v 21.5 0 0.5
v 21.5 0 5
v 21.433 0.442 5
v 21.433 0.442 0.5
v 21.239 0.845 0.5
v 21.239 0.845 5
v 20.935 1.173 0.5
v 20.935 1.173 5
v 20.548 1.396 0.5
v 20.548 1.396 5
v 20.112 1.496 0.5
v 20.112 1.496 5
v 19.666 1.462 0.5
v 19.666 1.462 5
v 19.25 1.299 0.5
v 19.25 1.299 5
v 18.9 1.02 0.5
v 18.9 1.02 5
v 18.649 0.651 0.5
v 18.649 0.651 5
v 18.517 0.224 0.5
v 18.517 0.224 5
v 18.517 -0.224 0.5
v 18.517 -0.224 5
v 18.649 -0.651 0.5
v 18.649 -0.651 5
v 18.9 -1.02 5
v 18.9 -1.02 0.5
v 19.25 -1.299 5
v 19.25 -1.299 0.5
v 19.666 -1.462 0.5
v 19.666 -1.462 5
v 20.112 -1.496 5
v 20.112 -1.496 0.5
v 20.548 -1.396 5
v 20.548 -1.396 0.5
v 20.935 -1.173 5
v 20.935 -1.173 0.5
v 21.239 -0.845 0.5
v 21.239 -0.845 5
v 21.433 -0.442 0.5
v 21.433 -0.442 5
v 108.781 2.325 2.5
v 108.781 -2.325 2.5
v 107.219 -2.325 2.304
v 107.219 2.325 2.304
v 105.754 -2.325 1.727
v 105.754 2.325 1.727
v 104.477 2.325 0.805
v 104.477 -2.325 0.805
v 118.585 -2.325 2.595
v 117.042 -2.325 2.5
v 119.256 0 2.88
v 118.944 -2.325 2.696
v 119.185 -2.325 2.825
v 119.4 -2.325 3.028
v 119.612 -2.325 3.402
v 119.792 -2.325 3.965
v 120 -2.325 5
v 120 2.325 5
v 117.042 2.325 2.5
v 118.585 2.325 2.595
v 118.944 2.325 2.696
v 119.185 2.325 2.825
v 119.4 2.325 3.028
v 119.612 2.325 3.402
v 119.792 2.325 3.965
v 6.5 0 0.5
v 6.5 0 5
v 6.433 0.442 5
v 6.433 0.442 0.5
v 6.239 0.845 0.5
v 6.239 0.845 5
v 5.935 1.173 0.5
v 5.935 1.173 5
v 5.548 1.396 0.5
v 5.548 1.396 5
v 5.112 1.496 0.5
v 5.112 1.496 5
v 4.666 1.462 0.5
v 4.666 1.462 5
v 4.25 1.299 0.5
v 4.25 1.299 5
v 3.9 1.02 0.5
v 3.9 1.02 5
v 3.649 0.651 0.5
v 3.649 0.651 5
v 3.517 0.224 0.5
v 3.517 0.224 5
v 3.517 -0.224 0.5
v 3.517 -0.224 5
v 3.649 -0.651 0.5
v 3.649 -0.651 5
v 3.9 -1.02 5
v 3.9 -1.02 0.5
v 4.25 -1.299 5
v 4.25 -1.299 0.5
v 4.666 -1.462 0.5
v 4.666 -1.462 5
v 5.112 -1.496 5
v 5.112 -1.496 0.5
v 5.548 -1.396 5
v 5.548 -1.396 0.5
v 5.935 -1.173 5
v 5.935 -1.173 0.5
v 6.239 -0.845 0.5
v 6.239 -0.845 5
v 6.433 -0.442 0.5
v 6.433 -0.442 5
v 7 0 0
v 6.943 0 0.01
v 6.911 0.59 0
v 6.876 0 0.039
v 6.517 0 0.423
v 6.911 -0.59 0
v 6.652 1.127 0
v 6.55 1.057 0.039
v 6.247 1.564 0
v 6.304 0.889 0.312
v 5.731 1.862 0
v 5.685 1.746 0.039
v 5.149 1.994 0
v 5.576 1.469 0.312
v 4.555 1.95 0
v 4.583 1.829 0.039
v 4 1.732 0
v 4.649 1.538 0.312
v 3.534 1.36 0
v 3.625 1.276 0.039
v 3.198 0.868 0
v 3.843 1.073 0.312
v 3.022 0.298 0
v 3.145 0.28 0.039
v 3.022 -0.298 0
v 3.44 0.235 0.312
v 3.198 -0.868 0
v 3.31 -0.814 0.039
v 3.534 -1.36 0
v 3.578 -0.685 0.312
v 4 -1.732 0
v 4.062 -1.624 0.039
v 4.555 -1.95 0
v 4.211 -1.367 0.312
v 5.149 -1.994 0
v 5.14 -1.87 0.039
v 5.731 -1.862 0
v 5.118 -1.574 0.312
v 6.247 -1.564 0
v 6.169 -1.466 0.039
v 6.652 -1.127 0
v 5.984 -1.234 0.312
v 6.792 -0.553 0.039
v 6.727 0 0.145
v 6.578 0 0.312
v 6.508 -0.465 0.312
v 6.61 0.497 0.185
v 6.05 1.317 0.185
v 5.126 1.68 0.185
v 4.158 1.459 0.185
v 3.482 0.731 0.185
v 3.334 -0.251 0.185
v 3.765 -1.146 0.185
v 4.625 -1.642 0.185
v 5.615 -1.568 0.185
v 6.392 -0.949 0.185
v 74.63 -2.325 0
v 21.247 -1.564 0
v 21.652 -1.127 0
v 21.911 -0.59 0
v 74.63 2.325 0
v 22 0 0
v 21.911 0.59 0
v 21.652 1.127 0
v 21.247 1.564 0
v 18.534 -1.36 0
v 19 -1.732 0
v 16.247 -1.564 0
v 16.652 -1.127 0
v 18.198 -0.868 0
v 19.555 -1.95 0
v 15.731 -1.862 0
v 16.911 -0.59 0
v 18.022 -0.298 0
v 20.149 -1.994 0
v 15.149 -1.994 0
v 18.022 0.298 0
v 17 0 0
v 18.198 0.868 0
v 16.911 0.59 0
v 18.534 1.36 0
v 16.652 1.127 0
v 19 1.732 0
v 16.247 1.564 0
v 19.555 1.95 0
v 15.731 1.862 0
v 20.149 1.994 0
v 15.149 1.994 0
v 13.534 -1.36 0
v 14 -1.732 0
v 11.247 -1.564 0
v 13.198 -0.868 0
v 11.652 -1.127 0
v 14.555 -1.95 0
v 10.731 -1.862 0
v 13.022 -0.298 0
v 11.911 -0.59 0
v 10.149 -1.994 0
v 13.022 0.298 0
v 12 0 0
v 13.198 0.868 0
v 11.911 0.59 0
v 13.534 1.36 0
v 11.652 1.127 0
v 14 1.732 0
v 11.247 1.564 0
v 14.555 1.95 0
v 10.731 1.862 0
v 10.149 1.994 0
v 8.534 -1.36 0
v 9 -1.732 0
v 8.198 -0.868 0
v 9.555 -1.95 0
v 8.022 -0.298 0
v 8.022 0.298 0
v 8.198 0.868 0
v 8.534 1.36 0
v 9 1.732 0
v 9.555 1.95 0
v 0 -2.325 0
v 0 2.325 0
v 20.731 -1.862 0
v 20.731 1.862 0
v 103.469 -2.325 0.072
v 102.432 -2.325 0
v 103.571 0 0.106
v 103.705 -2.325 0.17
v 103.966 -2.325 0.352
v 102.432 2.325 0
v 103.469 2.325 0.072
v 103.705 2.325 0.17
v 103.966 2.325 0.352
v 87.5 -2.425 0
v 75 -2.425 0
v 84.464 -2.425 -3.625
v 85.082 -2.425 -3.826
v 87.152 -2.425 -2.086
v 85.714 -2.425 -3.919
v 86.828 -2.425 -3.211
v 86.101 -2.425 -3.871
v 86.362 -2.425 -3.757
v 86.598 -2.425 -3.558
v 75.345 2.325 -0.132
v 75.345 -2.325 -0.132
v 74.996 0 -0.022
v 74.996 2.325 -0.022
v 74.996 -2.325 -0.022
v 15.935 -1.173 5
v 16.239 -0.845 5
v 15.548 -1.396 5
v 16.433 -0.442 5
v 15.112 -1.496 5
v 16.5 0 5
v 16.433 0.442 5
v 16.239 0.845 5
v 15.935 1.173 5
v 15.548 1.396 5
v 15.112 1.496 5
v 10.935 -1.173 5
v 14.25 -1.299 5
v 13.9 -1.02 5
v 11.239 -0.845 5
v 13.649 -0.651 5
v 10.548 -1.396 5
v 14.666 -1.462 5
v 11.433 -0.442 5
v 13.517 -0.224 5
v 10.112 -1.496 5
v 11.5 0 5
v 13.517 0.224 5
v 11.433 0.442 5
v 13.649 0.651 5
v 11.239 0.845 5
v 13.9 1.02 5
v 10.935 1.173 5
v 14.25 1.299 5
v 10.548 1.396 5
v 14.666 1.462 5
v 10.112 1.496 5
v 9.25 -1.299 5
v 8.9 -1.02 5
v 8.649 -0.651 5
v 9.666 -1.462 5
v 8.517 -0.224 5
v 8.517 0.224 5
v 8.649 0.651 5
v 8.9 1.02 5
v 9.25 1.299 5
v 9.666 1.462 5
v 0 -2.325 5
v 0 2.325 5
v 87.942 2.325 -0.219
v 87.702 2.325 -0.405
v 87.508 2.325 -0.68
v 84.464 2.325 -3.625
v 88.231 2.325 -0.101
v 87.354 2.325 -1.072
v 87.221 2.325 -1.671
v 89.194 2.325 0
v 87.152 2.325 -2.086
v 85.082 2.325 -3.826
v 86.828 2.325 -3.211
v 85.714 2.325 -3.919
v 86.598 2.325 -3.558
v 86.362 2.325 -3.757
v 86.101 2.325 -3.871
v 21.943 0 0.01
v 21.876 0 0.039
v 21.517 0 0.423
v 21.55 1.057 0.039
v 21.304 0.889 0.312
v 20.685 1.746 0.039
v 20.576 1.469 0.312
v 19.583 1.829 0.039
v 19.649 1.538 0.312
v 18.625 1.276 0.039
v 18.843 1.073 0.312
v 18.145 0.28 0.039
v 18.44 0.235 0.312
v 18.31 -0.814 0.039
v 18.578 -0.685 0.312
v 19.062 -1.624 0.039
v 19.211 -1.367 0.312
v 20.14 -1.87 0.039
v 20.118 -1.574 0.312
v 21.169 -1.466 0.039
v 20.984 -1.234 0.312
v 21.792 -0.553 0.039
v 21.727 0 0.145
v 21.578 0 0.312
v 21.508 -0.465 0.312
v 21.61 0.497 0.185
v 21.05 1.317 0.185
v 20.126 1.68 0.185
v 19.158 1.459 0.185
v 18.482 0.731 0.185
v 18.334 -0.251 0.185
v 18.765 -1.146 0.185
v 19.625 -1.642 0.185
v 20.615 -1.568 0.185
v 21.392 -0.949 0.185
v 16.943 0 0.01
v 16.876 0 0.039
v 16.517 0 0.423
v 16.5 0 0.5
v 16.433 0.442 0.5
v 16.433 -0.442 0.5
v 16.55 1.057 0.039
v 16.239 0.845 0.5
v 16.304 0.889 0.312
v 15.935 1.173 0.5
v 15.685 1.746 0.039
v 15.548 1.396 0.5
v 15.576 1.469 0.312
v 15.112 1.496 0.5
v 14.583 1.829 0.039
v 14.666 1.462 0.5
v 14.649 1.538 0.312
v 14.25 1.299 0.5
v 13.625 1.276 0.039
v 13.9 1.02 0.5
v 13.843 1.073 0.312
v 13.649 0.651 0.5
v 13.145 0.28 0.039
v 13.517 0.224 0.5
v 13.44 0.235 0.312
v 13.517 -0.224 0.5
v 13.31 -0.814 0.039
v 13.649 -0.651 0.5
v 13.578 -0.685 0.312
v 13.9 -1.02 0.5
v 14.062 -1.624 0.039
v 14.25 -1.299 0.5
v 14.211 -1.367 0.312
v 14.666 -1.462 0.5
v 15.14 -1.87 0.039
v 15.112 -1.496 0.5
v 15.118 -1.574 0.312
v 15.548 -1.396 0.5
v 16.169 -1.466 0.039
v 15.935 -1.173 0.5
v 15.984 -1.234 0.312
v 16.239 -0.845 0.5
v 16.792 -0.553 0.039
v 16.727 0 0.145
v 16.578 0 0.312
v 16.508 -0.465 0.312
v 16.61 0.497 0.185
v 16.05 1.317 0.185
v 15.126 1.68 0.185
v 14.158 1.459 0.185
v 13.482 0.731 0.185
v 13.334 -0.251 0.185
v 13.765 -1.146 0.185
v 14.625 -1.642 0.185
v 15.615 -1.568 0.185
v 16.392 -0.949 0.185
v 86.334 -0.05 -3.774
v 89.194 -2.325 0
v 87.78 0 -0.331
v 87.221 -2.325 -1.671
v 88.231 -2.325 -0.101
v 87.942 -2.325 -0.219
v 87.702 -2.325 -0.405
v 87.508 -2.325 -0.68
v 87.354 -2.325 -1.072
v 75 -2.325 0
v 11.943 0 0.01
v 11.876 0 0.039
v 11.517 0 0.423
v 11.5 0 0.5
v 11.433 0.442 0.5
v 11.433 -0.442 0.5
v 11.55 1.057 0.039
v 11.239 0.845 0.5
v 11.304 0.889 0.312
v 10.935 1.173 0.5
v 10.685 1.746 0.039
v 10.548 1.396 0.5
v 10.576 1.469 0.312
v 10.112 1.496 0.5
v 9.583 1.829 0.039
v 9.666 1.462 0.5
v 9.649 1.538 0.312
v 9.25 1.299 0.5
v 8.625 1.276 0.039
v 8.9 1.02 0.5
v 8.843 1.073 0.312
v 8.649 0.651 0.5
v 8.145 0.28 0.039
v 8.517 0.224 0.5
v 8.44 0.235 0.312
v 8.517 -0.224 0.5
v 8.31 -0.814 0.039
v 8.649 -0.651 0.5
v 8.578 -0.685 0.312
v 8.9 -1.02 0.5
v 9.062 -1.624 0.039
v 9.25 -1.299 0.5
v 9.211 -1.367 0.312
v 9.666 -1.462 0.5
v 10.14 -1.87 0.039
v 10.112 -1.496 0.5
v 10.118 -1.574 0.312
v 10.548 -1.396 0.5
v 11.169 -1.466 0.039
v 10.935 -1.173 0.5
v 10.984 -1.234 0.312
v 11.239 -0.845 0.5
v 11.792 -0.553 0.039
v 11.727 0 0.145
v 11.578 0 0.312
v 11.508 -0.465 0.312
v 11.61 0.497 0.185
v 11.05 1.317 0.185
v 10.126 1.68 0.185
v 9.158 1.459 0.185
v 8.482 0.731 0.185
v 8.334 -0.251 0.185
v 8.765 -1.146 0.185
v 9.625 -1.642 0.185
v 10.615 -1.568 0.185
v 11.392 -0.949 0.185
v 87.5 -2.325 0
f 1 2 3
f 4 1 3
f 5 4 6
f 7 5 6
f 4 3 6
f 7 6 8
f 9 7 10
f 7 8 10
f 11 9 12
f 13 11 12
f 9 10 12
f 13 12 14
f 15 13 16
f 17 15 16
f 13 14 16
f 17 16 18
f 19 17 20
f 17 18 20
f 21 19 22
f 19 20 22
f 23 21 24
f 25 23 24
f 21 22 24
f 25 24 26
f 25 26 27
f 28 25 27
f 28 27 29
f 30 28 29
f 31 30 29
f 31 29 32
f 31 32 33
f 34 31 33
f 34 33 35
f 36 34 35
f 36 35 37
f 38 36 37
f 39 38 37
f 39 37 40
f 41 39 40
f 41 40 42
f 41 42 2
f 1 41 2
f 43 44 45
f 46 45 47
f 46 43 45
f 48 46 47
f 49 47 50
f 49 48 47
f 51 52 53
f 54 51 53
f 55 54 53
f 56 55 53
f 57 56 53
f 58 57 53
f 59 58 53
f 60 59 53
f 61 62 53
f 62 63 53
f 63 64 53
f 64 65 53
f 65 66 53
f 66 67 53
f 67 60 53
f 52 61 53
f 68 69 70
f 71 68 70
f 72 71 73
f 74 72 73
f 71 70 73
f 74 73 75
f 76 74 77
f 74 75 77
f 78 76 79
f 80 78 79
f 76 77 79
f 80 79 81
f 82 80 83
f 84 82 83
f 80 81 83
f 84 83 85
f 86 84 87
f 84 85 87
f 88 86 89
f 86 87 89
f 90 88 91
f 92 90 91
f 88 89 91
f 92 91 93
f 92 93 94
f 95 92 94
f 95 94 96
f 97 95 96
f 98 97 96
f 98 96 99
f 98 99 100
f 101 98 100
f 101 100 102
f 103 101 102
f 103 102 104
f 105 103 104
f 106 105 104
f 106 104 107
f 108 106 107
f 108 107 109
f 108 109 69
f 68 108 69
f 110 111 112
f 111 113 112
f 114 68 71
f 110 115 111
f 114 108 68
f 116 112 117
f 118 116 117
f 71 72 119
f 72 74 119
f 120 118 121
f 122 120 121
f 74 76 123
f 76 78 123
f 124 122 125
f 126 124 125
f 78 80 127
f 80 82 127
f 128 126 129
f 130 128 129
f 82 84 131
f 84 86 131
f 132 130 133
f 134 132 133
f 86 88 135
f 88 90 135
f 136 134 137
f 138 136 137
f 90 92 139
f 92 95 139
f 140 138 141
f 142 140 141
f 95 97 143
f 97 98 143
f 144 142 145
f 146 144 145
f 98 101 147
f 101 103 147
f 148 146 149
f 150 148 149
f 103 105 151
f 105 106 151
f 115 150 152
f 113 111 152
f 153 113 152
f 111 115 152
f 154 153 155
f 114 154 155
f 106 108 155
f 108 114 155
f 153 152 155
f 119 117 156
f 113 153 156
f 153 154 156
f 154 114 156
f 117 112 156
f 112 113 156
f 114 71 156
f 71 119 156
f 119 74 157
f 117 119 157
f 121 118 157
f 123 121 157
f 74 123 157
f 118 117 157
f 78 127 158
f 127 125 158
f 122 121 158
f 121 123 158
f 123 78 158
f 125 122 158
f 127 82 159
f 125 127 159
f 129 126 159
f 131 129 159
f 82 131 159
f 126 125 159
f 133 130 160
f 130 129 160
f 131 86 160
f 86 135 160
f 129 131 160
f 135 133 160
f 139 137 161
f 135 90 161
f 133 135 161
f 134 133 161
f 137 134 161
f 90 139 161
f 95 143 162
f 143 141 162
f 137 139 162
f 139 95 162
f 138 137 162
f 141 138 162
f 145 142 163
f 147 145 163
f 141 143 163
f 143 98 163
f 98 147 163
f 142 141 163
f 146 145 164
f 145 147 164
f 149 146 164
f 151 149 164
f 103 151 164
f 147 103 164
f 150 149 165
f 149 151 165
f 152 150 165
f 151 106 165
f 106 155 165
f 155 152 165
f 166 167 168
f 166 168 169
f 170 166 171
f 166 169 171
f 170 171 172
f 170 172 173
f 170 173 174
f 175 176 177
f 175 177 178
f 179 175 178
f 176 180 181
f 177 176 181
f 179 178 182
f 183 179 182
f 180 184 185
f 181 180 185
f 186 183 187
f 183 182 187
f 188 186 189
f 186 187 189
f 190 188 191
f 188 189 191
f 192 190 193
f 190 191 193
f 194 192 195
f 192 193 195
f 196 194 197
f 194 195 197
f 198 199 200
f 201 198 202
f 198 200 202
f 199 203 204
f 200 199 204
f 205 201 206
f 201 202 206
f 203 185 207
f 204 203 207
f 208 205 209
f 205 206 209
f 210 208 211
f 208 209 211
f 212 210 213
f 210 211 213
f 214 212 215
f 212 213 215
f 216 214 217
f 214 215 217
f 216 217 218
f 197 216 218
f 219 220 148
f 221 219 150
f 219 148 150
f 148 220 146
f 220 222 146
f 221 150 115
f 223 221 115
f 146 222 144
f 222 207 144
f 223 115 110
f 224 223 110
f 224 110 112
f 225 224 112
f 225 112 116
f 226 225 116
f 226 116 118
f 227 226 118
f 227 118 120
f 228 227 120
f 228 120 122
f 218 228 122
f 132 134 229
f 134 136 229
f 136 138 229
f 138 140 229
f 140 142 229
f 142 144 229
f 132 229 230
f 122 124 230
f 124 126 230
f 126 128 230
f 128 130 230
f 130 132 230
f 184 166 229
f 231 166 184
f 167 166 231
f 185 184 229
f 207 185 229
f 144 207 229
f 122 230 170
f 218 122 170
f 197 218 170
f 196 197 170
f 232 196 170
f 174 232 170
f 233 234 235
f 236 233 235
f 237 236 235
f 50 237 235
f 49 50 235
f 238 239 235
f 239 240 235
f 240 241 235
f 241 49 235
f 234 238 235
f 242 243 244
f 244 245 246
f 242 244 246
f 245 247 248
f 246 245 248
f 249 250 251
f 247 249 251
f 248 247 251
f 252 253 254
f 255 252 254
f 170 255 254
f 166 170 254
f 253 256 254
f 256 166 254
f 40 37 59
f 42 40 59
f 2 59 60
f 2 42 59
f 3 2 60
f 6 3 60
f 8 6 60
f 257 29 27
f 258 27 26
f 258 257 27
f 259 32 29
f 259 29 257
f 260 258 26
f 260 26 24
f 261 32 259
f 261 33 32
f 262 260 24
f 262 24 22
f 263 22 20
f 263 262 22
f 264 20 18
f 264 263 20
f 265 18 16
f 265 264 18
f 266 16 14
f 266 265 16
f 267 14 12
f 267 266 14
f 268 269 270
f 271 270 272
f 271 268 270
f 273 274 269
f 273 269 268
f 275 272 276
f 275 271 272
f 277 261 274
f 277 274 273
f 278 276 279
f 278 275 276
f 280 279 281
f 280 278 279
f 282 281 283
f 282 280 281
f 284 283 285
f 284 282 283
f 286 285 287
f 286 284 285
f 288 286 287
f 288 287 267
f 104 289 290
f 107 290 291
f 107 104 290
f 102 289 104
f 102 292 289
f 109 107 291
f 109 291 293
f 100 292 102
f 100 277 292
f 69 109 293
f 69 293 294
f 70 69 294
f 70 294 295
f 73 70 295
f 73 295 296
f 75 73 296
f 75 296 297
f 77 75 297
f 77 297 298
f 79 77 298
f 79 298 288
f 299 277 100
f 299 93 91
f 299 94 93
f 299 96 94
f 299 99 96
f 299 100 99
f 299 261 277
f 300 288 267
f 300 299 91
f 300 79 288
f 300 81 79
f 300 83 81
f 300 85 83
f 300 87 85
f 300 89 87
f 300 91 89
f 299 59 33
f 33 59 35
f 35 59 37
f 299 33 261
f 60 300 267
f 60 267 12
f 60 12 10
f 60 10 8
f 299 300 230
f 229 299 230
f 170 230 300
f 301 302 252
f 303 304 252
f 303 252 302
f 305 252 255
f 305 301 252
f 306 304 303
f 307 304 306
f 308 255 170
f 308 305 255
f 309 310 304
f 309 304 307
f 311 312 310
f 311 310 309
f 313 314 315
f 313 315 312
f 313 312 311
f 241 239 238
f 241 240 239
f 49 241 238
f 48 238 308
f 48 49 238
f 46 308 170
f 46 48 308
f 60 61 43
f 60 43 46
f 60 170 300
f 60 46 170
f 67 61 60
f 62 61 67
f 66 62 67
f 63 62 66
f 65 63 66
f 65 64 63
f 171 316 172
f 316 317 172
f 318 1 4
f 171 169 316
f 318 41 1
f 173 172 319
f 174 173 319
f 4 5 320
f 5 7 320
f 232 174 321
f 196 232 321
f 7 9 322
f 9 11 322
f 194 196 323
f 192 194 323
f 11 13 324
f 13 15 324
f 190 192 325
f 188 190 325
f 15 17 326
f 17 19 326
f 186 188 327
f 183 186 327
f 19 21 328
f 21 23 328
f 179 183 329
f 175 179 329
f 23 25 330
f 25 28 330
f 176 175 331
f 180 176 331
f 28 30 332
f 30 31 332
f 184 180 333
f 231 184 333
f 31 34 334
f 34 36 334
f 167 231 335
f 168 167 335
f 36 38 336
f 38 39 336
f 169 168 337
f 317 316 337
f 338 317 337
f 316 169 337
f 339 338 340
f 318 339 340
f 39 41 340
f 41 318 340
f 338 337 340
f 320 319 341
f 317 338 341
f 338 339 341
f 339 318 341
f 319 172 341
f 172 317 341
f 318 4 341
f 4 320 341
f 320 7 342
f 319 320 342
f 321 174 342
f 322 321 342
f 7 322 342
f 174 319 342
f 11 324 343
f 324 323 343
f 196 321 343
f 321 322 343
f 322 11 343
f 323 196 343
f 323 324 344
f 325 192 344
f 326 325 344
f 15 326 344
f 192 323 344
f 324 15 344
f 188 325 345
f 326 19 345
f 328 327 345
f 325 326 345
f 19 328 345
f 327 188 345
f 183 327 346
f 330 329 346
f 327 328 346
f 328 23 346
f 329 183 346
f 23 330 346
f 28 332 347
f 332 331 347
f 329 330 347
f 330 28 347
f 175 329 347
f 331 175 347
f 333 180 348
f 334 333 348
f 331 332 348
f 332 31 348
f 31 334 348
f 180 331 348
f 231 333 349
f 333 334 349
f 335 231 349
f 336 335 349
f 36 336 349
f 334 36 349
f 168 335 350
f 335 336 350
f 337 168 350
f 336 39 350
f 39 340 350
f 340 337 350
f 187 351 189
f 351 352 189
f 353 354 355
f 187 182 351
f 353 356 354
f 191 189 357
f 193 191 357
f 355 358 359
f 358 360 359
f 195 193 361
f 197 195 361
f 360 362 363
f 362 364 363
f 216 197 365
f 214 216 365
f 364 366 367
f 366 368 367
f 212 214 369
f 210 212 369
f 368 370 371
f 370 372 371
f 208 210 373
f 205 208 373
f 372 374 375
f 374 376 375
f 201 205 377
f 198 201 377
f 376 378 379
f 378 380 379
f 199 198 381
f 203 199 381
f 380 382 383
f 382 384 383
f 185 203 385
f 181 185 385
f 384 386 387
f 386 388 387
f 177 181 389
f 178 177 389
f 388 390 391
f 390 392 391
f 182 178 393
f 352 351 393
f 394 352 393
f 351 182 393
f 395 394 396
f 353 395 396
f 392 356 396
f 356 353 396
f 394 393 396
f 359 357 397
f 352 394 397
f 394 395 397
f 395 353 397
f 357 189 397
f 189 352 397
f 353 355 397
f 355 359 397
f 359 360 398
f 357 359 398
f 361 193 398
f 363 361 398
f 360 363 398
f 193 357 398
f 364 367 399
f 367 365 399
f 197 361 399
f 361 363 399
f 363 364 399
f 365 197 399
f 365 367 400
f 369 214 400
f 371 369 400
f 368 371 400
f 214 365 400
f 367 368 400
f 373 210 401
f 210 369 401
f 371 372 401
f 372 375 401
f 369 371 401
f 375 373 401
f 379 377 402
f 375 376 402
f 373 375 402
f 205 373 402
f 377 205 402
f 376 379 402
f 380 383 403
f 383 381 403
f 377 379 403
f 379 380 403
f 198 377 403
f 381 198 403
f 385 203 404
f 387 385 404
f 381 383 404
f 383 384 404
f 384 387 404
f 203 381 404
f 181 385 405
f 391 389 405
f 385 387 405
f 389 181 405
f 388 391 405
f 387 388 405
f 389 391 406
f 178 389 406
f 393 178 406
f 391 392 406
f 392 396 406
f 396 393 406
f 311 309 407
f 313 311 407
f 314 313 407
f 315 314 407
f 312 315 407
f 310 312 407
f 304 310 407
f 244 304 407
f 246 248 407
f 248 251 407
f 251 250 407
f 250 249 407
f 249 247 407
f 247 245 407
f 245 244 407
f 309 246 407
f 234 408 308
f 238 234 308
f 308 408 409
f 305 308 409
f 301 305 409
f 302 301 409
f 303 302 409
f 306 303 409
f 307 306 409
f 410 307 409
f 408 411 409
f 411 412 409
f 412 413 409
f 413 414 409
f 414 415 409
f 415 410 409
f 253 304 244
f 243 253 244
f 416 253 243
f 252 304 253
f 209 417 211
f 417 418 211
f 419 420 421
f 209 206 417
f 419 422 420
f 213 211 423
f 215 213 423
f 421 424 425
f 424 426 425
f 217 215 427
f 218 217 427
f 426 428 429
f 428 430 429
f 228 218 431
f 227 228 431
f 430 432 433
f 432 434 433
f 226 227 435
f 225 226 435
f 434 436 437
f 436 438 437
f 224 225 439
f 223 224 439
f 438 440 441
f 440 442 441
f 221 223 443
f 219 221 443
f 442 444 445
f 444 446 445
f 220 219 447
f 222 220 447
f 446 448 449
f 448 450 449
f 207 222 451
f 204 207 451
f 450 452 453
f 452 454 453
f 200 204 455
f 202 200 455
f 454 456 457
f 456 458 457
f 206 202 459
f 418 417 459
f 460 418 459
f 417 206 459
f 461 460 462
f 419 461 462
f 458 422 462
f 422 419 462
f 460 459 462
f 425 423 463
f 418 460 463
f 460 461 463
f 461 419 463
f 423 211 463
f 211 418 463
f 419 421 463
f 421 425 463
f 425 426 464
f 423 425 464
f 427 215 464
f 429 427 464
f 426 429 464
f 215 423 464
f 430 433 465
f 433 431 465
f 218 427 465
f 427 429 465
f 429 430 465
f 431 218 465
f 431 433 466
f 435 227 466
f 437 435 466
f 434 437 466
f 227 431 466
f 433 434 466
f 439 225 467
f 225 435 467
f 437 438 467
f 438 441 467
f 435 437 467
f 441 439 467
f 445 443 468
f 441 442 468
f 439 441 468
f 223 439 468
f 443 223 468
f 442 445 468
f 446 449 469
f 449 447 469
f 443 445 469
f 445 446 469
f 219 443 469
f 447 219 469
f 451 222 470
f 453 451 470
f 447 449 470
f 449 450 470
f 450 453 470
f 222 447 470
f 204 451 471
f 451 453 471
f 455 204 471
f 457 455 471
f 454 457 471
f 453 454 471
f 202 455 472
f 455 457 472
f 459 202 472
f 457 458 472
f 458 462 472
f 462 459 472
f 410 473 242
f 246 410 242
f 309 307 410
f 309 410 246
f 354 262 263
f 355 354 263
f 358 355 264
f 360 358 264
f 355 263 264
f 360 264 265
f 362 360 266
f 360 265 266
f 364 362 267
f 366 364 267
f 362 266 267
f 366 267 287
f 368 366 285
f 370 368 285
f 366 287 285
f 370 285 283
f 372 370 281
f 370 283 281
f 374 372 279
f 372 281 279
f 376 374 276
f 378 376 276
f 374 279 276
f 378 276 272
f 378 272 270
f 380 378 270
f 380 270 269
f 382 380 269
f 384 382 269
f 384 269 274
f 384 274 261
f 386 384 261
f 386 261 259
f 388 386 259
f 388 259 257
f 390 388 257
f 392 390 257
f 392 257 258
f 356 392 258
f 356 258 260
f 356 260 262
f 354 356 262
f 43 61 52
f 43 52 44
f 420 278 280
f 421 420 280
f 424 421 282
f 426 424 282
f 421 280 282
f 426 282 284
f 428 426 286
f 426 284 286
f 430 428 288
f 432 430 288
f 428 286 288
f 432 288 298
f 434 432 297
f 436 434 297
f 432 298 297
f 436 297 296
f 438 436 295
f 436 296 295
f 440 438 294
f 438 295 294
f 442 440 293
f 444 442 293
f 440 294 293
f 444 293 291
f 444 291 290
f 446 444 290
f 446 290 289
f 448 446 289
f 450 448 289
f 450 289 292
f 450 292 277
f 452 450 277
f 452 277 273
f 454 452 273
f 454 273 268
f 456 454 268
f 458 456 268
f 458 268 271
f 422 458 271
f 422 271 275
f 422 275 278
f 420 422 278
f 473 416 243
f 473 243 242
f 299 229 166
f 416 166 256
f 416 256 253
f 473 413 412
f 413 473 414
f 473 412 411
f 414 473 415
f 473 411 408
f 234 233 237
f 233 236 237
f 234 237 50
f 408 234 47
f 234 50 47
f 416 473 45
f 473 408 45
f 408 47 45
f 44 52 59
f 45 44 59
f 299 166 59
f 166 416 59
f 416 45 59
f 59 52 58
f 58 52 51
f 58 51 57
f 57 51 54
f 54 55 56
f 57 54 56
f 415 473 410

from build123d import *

# Parameters (mm, degrees)
ESBO_O1_W                = 5
ESBO_O1_H                = 4.65
RESSALTO_EXTRUS_O1_DEPTH = 120
RESSALTO_EXTRUS_O2_DEPTH = 4.75
F_3_0MM_DOWEL_HOLE3_D    = 3
CUT_EXTRUDE2_DEPTH       = 10
FILLET4_START            = -3
FILLET4_DEPTH            = 6
FILLET1_SIZE             = 0.5
FILLET6_START            = -2.325
FILLET6_DEPTH            = 4.65
FILLET7_START            = -2.325
FILLET7_DEPTH            = 4.65


with BuildPart() as part:
    # Esboço1 → Ressalto-extrusão1 (new body)
    with BuildSketch(Plane(origin=(0, 0, 0), x_dir=(0, 0, -1), z_dir=(1, 0, 0))):
        with Locations((-2.5, 0)):
            Rectangle(ESBO_O1_W, ESBO_O1_H)
    extrude(amount=RESSALTO_EXTRUS_O1_DEPTH)

    # Esboço2 → Ressalto-extrusão2 (add)
    with BuildSketch(Plane(origin=(0, 2.325, 0), x_dir=(1, 0, 0), z_dir=(0, 1, 0))):
        Polygon((75, 0), (87.5, 0), (86.75, 4.5), align=None)
    extrude(amount=-RESSALTO_EXTRUS_O2_DEPTH)

    # Ø3.0mm Dowel Hole3 (through all)
    with Locations(Plane(origin=(0, 0, 0), x_dir=(-1, 0, 0), z_dir=(0, 0, -1))):
        with Locations((-5, 0), (-10, 0), (-15, 0), (-20, 0)):
            Hole(F_3_0MM_DOWEL_HOLE3_D / 2)

    # Sketch12 → Cut-Extrude2 (cut)
    with BuildSketch(Plane(origin=(0, 2.325, 0), x_dir=(1, 0, 0), z_dir=(0, 1, 0))):
        with BuildLine():
            Line((120, -2.5), (108.780523662, -2.5))
            ThreePointArc((108.780523662, -2.5), (105.971779801, -1.840547319), (103.75, 0))
            Line((103.75, 0), (120, 0))
            Line((120, 0), (120, -2.5))
        make_face()
    extrude(amount=-CUT_EXTRUDE2_DEPTH, mode=Mode.SUBTRACT)

    # Fillet4: read off the stored shape, not the designer's step
    # Fillet4 outline → Fillet4 (cut)
    with BuildSketch(Plane(origin=(0, 0, 0), x_dir=(1, 0, 0), z_dir=(0, 1, 0)).offset(FILLET4_START)):
        with BuildLine():
            add(Edge.make_bspline(
                [(104.477311177, -0.805478659), (103.613151376, 0), (102.431809752, 0)],
                knots=[0, 0, 0, 1, 1, 1], degree=2, weights=[1, 2.791376365, 1]))
            ThreePointArc((104.477311177, -0.805478659), (104.096310112, -0.418401518), (103.75, 0))
            Line((103.75, 0), (102.431809752, 0))
        make_face()
        with BuildLine():
            Line((120, -2.5), (117.041960108, -2.5))
            add(Edge.make_bspline(
                [(120, -5), (119.577422873, -2.5), (117.041960108, -2.5)],
                knots=[0, 0, 0, 1, 1, 1], degree=2, weights=[1, 2.291287847, 1]))
            Line((120, -5), (120, -2.5))
        make_face()
    extrude(amount=FILLET4_DEPTH, mode=Mode.SUBTRACT)

    # Fillet1
    # a fillet whose section is not a circle: 0.5 mm, written as the material it takes off along each edge
    with BuildSketch(Plane(origin=(20, 0, 0), x_dir=(1, 0, 0), z_dir=(0, -1, 0))) as fillet1_piece_1:
        with BuildLine():
            Bezier((1.5 + FILLET1_SIZE, 0), (1.5, 0), (1.5, FILLET1_SIZE), weights=[1, 0.353553391, 1])
            Line((1.5, FILLET1_SIZE), (1.5 - FILLET1_SIZE * 0.02, FILLET1_SIZE))
            Line((1.5 - FILLET1_SIZE * 0.02, FILLET1_SIZE), (1.5 - FILLET1_SIZE * 0.02, -FILLET1_SIZE * 0.02))
            Line((1.5 - FILLET1_SIZE * 0.02, -FILLET1_SIZE * 0.02), (1.5 + FILLET1_SIZE, -FILLET1_SIZE * 0.02))
            Line((1.5 + FILLET1_SIZE, -FILLET1_SIZE * 0.02), (1.5 + FILLET1_SIZE, 0))
        make_face()
    revolve(axis=Axis((20, 0, 0), (0, 0, 1)), mode=Mode.SUBTRACT)
    with BuildSketch(Plane(origin=(15, 0, 0), x_dir=(1, 0, 0), z_dir=(0, -1, 0))) as fillet1_piece_2:
        with BuildLine():
            Bezier((1.5 + FILLET1_SIZE, 0), (1.5, 0), (1.5, FILLET1_SIZE), weights=[1, 0.353553391, 1])
            Line((1.5, FILLET1_SIZE), (1.5 - FILLET1_SIZE * 0.02, FILLET1_SIZE))
            Line((1.5 - FILLET1_SIZE * 0.02, FILLET1_SIZE), (1.5 - FILLET1_SIZE * 0.02, -FILLET1_SIZE * 0.02))
            Line((1.5 - FILLET1_SIZE * 0.02, -FILLET1_SIZE * 0.02), (1.5 + FILLET1_SIZE, -FILLET1_SIZE * 0.02))
            Line((1.5 + FILLET1_SIZE, -FILLET1_SIZE * 0.02), (1.5 + FILLET1_SIZE, 0))
        make_face()
    revolve(axis=Axis((15, 0, 0), (0, 0, 1)), mode=Mode.SUBTRACT)
    with BuildSketch(Plane(origin=(10, 0, 0), x_dir=(1, 0, 0), z_dir=(0, -1, 0))) as fillet1_piece_3:
        with BuildLine():
            Bezier((1.5 + FILLET1_SIZE, 0), (1.5, 0), (1.5, FILLET1_SIZE), weights=[1, 0.353553391, 1])
            Line((1.5, FILLET1_SIZE), (1.5 - FILLET1_SIZE * 0.02, FILLET1_SIZE))
            Line((1.5 - FILLET1_SIZE * 0.02, FILLET1_SIZE), (1.5 - FILLET1_SIZE * 0.02, -FILLET1_SIZE * 0.02))
            Line((1.5 - FILLET1_SIZE * 0.02, -FILLET1_SIZE * 0.02), (1.5 + FILLET1_SIZE, -FILLET1_SIZE * 0.02))
            Line((1.5 + FILLET1_SIZE, -FILLET1_SIZE * 0.02), (1.5 + FILLET1_SIZE, 0))
        make_face()
    revolve(axis=Axis((10, 0, 0), (0, 0, 1)), mode=Mode.SUBTRACT)
    with BuildSketch(Plane(origin=(5, 0, 0), x_dir=(1, 0, 0), z_dir=(0, -1, 0))) as fillet1_piece_4:
        with BuildLine():
            Bezier((1.5 + FILLET1_SIZE, 0), (1.5, 0), (1.5, FILLET1_SIZE), weights=[1, 0.353553391, 1])
            Line((1.5, FILLET1_SIZE), (1.5 - FILLET1_SIZE * 0.02, FILLET1_SIZE))
            Line((1.5 - FILLET1_SIZE * 0.02, FILLET1_SIZE), (1.5 - FILLET1_SIZE * 0.02, -FILLET1_SIZE * 0.02))
            Line((1.5 - FILLET1_SIZE * 0.02, -FILLET1_SIZE * 0.02), (1.5 + FILLET1_SIZE, -FILLET1_SIZE * 0.02))
            Line((1.5 + FILLET1_SIZE, -FILLET1_SIZE * 0.02), (1.5 + FILLET1_SIZE, 0))
        make_face()
    revolve(axis=Axis((5, 0, 0), (0, 0, 1)), mode=Mode.SUBTRACT)

    # Fillet5
    # a fillet whose section is not a circle: 2 mm, written as the material it takes off along each edge
    with BuildSketch(Plane(origin=(86.75, 8.443980956, -4.5), x_dir=(-0.9338567516961642, 0, 0.35764726660704255), z_dir=(0, -1, 0))) as fillet5_piece_1:
        with BuildLine():
            Bezier((2.447592383, 0), (0, 0), (0.487697434, -2.398511973), weights=[1, 1.265499122, 1])
            Line((0.487697434, -2.398511973), (0, 0))
            Line((0, 0), (2.447592383, 0))
        make_face()
    extrude(amount=16.987961913, mode=Mode.SUBTRACT)

    # Fillet6: read off the stored shape, not the designer's step
    # Fillet6 outline → Fillet6 (add)
    with BuildSketch(Plane(origin=(0, 0, 0), x_dir=(1, 0, 0), z_dir=(0, 1, 0)).offset(FILLET6_START)):
        with BuildLine():
            Line((75, 0), (75.345414741, 0.132286497))
            add(Edge.make_bspline(
                [(75.345414741, 0.132286497), (75, 0), (74.630120208, 0)],
                knots=[0, 0, 0, 1, 1, 1], degree=2, weights=[1, 1.966650326, 1]))
            Line((74.630120208, 0), (75, 0))
        make_face()
    extrude(amount=FILLET6_DEPTH)

    # Fillet7: read off the stored shape, not the designer's step
    # Fillet7 outline → Fillet7 (add)
    with BuildSketch(Plane(origin=(0, 0, 0), x_dir=(1, 0, 0), z_dir=(0, 1, 0)).offset(FILLET7_START)):
        with BuildLine():
            Line((87.5, 0), (89.194254177, 0))
            add(Edge.make_bspline(
                [(89.194254177, 0), (87.5, 0), (87.221466329, 1.671202025)],
                knots=[0, 0, 0, 1, 1, 1], degree=2, weights=[1, 1.526039965, 1]))
            Line((87.221466329, 1.671202025), (87.5, 0))
        make_face()
    extrude(amount=FILLET7_DEPTH)


solid = part.part
